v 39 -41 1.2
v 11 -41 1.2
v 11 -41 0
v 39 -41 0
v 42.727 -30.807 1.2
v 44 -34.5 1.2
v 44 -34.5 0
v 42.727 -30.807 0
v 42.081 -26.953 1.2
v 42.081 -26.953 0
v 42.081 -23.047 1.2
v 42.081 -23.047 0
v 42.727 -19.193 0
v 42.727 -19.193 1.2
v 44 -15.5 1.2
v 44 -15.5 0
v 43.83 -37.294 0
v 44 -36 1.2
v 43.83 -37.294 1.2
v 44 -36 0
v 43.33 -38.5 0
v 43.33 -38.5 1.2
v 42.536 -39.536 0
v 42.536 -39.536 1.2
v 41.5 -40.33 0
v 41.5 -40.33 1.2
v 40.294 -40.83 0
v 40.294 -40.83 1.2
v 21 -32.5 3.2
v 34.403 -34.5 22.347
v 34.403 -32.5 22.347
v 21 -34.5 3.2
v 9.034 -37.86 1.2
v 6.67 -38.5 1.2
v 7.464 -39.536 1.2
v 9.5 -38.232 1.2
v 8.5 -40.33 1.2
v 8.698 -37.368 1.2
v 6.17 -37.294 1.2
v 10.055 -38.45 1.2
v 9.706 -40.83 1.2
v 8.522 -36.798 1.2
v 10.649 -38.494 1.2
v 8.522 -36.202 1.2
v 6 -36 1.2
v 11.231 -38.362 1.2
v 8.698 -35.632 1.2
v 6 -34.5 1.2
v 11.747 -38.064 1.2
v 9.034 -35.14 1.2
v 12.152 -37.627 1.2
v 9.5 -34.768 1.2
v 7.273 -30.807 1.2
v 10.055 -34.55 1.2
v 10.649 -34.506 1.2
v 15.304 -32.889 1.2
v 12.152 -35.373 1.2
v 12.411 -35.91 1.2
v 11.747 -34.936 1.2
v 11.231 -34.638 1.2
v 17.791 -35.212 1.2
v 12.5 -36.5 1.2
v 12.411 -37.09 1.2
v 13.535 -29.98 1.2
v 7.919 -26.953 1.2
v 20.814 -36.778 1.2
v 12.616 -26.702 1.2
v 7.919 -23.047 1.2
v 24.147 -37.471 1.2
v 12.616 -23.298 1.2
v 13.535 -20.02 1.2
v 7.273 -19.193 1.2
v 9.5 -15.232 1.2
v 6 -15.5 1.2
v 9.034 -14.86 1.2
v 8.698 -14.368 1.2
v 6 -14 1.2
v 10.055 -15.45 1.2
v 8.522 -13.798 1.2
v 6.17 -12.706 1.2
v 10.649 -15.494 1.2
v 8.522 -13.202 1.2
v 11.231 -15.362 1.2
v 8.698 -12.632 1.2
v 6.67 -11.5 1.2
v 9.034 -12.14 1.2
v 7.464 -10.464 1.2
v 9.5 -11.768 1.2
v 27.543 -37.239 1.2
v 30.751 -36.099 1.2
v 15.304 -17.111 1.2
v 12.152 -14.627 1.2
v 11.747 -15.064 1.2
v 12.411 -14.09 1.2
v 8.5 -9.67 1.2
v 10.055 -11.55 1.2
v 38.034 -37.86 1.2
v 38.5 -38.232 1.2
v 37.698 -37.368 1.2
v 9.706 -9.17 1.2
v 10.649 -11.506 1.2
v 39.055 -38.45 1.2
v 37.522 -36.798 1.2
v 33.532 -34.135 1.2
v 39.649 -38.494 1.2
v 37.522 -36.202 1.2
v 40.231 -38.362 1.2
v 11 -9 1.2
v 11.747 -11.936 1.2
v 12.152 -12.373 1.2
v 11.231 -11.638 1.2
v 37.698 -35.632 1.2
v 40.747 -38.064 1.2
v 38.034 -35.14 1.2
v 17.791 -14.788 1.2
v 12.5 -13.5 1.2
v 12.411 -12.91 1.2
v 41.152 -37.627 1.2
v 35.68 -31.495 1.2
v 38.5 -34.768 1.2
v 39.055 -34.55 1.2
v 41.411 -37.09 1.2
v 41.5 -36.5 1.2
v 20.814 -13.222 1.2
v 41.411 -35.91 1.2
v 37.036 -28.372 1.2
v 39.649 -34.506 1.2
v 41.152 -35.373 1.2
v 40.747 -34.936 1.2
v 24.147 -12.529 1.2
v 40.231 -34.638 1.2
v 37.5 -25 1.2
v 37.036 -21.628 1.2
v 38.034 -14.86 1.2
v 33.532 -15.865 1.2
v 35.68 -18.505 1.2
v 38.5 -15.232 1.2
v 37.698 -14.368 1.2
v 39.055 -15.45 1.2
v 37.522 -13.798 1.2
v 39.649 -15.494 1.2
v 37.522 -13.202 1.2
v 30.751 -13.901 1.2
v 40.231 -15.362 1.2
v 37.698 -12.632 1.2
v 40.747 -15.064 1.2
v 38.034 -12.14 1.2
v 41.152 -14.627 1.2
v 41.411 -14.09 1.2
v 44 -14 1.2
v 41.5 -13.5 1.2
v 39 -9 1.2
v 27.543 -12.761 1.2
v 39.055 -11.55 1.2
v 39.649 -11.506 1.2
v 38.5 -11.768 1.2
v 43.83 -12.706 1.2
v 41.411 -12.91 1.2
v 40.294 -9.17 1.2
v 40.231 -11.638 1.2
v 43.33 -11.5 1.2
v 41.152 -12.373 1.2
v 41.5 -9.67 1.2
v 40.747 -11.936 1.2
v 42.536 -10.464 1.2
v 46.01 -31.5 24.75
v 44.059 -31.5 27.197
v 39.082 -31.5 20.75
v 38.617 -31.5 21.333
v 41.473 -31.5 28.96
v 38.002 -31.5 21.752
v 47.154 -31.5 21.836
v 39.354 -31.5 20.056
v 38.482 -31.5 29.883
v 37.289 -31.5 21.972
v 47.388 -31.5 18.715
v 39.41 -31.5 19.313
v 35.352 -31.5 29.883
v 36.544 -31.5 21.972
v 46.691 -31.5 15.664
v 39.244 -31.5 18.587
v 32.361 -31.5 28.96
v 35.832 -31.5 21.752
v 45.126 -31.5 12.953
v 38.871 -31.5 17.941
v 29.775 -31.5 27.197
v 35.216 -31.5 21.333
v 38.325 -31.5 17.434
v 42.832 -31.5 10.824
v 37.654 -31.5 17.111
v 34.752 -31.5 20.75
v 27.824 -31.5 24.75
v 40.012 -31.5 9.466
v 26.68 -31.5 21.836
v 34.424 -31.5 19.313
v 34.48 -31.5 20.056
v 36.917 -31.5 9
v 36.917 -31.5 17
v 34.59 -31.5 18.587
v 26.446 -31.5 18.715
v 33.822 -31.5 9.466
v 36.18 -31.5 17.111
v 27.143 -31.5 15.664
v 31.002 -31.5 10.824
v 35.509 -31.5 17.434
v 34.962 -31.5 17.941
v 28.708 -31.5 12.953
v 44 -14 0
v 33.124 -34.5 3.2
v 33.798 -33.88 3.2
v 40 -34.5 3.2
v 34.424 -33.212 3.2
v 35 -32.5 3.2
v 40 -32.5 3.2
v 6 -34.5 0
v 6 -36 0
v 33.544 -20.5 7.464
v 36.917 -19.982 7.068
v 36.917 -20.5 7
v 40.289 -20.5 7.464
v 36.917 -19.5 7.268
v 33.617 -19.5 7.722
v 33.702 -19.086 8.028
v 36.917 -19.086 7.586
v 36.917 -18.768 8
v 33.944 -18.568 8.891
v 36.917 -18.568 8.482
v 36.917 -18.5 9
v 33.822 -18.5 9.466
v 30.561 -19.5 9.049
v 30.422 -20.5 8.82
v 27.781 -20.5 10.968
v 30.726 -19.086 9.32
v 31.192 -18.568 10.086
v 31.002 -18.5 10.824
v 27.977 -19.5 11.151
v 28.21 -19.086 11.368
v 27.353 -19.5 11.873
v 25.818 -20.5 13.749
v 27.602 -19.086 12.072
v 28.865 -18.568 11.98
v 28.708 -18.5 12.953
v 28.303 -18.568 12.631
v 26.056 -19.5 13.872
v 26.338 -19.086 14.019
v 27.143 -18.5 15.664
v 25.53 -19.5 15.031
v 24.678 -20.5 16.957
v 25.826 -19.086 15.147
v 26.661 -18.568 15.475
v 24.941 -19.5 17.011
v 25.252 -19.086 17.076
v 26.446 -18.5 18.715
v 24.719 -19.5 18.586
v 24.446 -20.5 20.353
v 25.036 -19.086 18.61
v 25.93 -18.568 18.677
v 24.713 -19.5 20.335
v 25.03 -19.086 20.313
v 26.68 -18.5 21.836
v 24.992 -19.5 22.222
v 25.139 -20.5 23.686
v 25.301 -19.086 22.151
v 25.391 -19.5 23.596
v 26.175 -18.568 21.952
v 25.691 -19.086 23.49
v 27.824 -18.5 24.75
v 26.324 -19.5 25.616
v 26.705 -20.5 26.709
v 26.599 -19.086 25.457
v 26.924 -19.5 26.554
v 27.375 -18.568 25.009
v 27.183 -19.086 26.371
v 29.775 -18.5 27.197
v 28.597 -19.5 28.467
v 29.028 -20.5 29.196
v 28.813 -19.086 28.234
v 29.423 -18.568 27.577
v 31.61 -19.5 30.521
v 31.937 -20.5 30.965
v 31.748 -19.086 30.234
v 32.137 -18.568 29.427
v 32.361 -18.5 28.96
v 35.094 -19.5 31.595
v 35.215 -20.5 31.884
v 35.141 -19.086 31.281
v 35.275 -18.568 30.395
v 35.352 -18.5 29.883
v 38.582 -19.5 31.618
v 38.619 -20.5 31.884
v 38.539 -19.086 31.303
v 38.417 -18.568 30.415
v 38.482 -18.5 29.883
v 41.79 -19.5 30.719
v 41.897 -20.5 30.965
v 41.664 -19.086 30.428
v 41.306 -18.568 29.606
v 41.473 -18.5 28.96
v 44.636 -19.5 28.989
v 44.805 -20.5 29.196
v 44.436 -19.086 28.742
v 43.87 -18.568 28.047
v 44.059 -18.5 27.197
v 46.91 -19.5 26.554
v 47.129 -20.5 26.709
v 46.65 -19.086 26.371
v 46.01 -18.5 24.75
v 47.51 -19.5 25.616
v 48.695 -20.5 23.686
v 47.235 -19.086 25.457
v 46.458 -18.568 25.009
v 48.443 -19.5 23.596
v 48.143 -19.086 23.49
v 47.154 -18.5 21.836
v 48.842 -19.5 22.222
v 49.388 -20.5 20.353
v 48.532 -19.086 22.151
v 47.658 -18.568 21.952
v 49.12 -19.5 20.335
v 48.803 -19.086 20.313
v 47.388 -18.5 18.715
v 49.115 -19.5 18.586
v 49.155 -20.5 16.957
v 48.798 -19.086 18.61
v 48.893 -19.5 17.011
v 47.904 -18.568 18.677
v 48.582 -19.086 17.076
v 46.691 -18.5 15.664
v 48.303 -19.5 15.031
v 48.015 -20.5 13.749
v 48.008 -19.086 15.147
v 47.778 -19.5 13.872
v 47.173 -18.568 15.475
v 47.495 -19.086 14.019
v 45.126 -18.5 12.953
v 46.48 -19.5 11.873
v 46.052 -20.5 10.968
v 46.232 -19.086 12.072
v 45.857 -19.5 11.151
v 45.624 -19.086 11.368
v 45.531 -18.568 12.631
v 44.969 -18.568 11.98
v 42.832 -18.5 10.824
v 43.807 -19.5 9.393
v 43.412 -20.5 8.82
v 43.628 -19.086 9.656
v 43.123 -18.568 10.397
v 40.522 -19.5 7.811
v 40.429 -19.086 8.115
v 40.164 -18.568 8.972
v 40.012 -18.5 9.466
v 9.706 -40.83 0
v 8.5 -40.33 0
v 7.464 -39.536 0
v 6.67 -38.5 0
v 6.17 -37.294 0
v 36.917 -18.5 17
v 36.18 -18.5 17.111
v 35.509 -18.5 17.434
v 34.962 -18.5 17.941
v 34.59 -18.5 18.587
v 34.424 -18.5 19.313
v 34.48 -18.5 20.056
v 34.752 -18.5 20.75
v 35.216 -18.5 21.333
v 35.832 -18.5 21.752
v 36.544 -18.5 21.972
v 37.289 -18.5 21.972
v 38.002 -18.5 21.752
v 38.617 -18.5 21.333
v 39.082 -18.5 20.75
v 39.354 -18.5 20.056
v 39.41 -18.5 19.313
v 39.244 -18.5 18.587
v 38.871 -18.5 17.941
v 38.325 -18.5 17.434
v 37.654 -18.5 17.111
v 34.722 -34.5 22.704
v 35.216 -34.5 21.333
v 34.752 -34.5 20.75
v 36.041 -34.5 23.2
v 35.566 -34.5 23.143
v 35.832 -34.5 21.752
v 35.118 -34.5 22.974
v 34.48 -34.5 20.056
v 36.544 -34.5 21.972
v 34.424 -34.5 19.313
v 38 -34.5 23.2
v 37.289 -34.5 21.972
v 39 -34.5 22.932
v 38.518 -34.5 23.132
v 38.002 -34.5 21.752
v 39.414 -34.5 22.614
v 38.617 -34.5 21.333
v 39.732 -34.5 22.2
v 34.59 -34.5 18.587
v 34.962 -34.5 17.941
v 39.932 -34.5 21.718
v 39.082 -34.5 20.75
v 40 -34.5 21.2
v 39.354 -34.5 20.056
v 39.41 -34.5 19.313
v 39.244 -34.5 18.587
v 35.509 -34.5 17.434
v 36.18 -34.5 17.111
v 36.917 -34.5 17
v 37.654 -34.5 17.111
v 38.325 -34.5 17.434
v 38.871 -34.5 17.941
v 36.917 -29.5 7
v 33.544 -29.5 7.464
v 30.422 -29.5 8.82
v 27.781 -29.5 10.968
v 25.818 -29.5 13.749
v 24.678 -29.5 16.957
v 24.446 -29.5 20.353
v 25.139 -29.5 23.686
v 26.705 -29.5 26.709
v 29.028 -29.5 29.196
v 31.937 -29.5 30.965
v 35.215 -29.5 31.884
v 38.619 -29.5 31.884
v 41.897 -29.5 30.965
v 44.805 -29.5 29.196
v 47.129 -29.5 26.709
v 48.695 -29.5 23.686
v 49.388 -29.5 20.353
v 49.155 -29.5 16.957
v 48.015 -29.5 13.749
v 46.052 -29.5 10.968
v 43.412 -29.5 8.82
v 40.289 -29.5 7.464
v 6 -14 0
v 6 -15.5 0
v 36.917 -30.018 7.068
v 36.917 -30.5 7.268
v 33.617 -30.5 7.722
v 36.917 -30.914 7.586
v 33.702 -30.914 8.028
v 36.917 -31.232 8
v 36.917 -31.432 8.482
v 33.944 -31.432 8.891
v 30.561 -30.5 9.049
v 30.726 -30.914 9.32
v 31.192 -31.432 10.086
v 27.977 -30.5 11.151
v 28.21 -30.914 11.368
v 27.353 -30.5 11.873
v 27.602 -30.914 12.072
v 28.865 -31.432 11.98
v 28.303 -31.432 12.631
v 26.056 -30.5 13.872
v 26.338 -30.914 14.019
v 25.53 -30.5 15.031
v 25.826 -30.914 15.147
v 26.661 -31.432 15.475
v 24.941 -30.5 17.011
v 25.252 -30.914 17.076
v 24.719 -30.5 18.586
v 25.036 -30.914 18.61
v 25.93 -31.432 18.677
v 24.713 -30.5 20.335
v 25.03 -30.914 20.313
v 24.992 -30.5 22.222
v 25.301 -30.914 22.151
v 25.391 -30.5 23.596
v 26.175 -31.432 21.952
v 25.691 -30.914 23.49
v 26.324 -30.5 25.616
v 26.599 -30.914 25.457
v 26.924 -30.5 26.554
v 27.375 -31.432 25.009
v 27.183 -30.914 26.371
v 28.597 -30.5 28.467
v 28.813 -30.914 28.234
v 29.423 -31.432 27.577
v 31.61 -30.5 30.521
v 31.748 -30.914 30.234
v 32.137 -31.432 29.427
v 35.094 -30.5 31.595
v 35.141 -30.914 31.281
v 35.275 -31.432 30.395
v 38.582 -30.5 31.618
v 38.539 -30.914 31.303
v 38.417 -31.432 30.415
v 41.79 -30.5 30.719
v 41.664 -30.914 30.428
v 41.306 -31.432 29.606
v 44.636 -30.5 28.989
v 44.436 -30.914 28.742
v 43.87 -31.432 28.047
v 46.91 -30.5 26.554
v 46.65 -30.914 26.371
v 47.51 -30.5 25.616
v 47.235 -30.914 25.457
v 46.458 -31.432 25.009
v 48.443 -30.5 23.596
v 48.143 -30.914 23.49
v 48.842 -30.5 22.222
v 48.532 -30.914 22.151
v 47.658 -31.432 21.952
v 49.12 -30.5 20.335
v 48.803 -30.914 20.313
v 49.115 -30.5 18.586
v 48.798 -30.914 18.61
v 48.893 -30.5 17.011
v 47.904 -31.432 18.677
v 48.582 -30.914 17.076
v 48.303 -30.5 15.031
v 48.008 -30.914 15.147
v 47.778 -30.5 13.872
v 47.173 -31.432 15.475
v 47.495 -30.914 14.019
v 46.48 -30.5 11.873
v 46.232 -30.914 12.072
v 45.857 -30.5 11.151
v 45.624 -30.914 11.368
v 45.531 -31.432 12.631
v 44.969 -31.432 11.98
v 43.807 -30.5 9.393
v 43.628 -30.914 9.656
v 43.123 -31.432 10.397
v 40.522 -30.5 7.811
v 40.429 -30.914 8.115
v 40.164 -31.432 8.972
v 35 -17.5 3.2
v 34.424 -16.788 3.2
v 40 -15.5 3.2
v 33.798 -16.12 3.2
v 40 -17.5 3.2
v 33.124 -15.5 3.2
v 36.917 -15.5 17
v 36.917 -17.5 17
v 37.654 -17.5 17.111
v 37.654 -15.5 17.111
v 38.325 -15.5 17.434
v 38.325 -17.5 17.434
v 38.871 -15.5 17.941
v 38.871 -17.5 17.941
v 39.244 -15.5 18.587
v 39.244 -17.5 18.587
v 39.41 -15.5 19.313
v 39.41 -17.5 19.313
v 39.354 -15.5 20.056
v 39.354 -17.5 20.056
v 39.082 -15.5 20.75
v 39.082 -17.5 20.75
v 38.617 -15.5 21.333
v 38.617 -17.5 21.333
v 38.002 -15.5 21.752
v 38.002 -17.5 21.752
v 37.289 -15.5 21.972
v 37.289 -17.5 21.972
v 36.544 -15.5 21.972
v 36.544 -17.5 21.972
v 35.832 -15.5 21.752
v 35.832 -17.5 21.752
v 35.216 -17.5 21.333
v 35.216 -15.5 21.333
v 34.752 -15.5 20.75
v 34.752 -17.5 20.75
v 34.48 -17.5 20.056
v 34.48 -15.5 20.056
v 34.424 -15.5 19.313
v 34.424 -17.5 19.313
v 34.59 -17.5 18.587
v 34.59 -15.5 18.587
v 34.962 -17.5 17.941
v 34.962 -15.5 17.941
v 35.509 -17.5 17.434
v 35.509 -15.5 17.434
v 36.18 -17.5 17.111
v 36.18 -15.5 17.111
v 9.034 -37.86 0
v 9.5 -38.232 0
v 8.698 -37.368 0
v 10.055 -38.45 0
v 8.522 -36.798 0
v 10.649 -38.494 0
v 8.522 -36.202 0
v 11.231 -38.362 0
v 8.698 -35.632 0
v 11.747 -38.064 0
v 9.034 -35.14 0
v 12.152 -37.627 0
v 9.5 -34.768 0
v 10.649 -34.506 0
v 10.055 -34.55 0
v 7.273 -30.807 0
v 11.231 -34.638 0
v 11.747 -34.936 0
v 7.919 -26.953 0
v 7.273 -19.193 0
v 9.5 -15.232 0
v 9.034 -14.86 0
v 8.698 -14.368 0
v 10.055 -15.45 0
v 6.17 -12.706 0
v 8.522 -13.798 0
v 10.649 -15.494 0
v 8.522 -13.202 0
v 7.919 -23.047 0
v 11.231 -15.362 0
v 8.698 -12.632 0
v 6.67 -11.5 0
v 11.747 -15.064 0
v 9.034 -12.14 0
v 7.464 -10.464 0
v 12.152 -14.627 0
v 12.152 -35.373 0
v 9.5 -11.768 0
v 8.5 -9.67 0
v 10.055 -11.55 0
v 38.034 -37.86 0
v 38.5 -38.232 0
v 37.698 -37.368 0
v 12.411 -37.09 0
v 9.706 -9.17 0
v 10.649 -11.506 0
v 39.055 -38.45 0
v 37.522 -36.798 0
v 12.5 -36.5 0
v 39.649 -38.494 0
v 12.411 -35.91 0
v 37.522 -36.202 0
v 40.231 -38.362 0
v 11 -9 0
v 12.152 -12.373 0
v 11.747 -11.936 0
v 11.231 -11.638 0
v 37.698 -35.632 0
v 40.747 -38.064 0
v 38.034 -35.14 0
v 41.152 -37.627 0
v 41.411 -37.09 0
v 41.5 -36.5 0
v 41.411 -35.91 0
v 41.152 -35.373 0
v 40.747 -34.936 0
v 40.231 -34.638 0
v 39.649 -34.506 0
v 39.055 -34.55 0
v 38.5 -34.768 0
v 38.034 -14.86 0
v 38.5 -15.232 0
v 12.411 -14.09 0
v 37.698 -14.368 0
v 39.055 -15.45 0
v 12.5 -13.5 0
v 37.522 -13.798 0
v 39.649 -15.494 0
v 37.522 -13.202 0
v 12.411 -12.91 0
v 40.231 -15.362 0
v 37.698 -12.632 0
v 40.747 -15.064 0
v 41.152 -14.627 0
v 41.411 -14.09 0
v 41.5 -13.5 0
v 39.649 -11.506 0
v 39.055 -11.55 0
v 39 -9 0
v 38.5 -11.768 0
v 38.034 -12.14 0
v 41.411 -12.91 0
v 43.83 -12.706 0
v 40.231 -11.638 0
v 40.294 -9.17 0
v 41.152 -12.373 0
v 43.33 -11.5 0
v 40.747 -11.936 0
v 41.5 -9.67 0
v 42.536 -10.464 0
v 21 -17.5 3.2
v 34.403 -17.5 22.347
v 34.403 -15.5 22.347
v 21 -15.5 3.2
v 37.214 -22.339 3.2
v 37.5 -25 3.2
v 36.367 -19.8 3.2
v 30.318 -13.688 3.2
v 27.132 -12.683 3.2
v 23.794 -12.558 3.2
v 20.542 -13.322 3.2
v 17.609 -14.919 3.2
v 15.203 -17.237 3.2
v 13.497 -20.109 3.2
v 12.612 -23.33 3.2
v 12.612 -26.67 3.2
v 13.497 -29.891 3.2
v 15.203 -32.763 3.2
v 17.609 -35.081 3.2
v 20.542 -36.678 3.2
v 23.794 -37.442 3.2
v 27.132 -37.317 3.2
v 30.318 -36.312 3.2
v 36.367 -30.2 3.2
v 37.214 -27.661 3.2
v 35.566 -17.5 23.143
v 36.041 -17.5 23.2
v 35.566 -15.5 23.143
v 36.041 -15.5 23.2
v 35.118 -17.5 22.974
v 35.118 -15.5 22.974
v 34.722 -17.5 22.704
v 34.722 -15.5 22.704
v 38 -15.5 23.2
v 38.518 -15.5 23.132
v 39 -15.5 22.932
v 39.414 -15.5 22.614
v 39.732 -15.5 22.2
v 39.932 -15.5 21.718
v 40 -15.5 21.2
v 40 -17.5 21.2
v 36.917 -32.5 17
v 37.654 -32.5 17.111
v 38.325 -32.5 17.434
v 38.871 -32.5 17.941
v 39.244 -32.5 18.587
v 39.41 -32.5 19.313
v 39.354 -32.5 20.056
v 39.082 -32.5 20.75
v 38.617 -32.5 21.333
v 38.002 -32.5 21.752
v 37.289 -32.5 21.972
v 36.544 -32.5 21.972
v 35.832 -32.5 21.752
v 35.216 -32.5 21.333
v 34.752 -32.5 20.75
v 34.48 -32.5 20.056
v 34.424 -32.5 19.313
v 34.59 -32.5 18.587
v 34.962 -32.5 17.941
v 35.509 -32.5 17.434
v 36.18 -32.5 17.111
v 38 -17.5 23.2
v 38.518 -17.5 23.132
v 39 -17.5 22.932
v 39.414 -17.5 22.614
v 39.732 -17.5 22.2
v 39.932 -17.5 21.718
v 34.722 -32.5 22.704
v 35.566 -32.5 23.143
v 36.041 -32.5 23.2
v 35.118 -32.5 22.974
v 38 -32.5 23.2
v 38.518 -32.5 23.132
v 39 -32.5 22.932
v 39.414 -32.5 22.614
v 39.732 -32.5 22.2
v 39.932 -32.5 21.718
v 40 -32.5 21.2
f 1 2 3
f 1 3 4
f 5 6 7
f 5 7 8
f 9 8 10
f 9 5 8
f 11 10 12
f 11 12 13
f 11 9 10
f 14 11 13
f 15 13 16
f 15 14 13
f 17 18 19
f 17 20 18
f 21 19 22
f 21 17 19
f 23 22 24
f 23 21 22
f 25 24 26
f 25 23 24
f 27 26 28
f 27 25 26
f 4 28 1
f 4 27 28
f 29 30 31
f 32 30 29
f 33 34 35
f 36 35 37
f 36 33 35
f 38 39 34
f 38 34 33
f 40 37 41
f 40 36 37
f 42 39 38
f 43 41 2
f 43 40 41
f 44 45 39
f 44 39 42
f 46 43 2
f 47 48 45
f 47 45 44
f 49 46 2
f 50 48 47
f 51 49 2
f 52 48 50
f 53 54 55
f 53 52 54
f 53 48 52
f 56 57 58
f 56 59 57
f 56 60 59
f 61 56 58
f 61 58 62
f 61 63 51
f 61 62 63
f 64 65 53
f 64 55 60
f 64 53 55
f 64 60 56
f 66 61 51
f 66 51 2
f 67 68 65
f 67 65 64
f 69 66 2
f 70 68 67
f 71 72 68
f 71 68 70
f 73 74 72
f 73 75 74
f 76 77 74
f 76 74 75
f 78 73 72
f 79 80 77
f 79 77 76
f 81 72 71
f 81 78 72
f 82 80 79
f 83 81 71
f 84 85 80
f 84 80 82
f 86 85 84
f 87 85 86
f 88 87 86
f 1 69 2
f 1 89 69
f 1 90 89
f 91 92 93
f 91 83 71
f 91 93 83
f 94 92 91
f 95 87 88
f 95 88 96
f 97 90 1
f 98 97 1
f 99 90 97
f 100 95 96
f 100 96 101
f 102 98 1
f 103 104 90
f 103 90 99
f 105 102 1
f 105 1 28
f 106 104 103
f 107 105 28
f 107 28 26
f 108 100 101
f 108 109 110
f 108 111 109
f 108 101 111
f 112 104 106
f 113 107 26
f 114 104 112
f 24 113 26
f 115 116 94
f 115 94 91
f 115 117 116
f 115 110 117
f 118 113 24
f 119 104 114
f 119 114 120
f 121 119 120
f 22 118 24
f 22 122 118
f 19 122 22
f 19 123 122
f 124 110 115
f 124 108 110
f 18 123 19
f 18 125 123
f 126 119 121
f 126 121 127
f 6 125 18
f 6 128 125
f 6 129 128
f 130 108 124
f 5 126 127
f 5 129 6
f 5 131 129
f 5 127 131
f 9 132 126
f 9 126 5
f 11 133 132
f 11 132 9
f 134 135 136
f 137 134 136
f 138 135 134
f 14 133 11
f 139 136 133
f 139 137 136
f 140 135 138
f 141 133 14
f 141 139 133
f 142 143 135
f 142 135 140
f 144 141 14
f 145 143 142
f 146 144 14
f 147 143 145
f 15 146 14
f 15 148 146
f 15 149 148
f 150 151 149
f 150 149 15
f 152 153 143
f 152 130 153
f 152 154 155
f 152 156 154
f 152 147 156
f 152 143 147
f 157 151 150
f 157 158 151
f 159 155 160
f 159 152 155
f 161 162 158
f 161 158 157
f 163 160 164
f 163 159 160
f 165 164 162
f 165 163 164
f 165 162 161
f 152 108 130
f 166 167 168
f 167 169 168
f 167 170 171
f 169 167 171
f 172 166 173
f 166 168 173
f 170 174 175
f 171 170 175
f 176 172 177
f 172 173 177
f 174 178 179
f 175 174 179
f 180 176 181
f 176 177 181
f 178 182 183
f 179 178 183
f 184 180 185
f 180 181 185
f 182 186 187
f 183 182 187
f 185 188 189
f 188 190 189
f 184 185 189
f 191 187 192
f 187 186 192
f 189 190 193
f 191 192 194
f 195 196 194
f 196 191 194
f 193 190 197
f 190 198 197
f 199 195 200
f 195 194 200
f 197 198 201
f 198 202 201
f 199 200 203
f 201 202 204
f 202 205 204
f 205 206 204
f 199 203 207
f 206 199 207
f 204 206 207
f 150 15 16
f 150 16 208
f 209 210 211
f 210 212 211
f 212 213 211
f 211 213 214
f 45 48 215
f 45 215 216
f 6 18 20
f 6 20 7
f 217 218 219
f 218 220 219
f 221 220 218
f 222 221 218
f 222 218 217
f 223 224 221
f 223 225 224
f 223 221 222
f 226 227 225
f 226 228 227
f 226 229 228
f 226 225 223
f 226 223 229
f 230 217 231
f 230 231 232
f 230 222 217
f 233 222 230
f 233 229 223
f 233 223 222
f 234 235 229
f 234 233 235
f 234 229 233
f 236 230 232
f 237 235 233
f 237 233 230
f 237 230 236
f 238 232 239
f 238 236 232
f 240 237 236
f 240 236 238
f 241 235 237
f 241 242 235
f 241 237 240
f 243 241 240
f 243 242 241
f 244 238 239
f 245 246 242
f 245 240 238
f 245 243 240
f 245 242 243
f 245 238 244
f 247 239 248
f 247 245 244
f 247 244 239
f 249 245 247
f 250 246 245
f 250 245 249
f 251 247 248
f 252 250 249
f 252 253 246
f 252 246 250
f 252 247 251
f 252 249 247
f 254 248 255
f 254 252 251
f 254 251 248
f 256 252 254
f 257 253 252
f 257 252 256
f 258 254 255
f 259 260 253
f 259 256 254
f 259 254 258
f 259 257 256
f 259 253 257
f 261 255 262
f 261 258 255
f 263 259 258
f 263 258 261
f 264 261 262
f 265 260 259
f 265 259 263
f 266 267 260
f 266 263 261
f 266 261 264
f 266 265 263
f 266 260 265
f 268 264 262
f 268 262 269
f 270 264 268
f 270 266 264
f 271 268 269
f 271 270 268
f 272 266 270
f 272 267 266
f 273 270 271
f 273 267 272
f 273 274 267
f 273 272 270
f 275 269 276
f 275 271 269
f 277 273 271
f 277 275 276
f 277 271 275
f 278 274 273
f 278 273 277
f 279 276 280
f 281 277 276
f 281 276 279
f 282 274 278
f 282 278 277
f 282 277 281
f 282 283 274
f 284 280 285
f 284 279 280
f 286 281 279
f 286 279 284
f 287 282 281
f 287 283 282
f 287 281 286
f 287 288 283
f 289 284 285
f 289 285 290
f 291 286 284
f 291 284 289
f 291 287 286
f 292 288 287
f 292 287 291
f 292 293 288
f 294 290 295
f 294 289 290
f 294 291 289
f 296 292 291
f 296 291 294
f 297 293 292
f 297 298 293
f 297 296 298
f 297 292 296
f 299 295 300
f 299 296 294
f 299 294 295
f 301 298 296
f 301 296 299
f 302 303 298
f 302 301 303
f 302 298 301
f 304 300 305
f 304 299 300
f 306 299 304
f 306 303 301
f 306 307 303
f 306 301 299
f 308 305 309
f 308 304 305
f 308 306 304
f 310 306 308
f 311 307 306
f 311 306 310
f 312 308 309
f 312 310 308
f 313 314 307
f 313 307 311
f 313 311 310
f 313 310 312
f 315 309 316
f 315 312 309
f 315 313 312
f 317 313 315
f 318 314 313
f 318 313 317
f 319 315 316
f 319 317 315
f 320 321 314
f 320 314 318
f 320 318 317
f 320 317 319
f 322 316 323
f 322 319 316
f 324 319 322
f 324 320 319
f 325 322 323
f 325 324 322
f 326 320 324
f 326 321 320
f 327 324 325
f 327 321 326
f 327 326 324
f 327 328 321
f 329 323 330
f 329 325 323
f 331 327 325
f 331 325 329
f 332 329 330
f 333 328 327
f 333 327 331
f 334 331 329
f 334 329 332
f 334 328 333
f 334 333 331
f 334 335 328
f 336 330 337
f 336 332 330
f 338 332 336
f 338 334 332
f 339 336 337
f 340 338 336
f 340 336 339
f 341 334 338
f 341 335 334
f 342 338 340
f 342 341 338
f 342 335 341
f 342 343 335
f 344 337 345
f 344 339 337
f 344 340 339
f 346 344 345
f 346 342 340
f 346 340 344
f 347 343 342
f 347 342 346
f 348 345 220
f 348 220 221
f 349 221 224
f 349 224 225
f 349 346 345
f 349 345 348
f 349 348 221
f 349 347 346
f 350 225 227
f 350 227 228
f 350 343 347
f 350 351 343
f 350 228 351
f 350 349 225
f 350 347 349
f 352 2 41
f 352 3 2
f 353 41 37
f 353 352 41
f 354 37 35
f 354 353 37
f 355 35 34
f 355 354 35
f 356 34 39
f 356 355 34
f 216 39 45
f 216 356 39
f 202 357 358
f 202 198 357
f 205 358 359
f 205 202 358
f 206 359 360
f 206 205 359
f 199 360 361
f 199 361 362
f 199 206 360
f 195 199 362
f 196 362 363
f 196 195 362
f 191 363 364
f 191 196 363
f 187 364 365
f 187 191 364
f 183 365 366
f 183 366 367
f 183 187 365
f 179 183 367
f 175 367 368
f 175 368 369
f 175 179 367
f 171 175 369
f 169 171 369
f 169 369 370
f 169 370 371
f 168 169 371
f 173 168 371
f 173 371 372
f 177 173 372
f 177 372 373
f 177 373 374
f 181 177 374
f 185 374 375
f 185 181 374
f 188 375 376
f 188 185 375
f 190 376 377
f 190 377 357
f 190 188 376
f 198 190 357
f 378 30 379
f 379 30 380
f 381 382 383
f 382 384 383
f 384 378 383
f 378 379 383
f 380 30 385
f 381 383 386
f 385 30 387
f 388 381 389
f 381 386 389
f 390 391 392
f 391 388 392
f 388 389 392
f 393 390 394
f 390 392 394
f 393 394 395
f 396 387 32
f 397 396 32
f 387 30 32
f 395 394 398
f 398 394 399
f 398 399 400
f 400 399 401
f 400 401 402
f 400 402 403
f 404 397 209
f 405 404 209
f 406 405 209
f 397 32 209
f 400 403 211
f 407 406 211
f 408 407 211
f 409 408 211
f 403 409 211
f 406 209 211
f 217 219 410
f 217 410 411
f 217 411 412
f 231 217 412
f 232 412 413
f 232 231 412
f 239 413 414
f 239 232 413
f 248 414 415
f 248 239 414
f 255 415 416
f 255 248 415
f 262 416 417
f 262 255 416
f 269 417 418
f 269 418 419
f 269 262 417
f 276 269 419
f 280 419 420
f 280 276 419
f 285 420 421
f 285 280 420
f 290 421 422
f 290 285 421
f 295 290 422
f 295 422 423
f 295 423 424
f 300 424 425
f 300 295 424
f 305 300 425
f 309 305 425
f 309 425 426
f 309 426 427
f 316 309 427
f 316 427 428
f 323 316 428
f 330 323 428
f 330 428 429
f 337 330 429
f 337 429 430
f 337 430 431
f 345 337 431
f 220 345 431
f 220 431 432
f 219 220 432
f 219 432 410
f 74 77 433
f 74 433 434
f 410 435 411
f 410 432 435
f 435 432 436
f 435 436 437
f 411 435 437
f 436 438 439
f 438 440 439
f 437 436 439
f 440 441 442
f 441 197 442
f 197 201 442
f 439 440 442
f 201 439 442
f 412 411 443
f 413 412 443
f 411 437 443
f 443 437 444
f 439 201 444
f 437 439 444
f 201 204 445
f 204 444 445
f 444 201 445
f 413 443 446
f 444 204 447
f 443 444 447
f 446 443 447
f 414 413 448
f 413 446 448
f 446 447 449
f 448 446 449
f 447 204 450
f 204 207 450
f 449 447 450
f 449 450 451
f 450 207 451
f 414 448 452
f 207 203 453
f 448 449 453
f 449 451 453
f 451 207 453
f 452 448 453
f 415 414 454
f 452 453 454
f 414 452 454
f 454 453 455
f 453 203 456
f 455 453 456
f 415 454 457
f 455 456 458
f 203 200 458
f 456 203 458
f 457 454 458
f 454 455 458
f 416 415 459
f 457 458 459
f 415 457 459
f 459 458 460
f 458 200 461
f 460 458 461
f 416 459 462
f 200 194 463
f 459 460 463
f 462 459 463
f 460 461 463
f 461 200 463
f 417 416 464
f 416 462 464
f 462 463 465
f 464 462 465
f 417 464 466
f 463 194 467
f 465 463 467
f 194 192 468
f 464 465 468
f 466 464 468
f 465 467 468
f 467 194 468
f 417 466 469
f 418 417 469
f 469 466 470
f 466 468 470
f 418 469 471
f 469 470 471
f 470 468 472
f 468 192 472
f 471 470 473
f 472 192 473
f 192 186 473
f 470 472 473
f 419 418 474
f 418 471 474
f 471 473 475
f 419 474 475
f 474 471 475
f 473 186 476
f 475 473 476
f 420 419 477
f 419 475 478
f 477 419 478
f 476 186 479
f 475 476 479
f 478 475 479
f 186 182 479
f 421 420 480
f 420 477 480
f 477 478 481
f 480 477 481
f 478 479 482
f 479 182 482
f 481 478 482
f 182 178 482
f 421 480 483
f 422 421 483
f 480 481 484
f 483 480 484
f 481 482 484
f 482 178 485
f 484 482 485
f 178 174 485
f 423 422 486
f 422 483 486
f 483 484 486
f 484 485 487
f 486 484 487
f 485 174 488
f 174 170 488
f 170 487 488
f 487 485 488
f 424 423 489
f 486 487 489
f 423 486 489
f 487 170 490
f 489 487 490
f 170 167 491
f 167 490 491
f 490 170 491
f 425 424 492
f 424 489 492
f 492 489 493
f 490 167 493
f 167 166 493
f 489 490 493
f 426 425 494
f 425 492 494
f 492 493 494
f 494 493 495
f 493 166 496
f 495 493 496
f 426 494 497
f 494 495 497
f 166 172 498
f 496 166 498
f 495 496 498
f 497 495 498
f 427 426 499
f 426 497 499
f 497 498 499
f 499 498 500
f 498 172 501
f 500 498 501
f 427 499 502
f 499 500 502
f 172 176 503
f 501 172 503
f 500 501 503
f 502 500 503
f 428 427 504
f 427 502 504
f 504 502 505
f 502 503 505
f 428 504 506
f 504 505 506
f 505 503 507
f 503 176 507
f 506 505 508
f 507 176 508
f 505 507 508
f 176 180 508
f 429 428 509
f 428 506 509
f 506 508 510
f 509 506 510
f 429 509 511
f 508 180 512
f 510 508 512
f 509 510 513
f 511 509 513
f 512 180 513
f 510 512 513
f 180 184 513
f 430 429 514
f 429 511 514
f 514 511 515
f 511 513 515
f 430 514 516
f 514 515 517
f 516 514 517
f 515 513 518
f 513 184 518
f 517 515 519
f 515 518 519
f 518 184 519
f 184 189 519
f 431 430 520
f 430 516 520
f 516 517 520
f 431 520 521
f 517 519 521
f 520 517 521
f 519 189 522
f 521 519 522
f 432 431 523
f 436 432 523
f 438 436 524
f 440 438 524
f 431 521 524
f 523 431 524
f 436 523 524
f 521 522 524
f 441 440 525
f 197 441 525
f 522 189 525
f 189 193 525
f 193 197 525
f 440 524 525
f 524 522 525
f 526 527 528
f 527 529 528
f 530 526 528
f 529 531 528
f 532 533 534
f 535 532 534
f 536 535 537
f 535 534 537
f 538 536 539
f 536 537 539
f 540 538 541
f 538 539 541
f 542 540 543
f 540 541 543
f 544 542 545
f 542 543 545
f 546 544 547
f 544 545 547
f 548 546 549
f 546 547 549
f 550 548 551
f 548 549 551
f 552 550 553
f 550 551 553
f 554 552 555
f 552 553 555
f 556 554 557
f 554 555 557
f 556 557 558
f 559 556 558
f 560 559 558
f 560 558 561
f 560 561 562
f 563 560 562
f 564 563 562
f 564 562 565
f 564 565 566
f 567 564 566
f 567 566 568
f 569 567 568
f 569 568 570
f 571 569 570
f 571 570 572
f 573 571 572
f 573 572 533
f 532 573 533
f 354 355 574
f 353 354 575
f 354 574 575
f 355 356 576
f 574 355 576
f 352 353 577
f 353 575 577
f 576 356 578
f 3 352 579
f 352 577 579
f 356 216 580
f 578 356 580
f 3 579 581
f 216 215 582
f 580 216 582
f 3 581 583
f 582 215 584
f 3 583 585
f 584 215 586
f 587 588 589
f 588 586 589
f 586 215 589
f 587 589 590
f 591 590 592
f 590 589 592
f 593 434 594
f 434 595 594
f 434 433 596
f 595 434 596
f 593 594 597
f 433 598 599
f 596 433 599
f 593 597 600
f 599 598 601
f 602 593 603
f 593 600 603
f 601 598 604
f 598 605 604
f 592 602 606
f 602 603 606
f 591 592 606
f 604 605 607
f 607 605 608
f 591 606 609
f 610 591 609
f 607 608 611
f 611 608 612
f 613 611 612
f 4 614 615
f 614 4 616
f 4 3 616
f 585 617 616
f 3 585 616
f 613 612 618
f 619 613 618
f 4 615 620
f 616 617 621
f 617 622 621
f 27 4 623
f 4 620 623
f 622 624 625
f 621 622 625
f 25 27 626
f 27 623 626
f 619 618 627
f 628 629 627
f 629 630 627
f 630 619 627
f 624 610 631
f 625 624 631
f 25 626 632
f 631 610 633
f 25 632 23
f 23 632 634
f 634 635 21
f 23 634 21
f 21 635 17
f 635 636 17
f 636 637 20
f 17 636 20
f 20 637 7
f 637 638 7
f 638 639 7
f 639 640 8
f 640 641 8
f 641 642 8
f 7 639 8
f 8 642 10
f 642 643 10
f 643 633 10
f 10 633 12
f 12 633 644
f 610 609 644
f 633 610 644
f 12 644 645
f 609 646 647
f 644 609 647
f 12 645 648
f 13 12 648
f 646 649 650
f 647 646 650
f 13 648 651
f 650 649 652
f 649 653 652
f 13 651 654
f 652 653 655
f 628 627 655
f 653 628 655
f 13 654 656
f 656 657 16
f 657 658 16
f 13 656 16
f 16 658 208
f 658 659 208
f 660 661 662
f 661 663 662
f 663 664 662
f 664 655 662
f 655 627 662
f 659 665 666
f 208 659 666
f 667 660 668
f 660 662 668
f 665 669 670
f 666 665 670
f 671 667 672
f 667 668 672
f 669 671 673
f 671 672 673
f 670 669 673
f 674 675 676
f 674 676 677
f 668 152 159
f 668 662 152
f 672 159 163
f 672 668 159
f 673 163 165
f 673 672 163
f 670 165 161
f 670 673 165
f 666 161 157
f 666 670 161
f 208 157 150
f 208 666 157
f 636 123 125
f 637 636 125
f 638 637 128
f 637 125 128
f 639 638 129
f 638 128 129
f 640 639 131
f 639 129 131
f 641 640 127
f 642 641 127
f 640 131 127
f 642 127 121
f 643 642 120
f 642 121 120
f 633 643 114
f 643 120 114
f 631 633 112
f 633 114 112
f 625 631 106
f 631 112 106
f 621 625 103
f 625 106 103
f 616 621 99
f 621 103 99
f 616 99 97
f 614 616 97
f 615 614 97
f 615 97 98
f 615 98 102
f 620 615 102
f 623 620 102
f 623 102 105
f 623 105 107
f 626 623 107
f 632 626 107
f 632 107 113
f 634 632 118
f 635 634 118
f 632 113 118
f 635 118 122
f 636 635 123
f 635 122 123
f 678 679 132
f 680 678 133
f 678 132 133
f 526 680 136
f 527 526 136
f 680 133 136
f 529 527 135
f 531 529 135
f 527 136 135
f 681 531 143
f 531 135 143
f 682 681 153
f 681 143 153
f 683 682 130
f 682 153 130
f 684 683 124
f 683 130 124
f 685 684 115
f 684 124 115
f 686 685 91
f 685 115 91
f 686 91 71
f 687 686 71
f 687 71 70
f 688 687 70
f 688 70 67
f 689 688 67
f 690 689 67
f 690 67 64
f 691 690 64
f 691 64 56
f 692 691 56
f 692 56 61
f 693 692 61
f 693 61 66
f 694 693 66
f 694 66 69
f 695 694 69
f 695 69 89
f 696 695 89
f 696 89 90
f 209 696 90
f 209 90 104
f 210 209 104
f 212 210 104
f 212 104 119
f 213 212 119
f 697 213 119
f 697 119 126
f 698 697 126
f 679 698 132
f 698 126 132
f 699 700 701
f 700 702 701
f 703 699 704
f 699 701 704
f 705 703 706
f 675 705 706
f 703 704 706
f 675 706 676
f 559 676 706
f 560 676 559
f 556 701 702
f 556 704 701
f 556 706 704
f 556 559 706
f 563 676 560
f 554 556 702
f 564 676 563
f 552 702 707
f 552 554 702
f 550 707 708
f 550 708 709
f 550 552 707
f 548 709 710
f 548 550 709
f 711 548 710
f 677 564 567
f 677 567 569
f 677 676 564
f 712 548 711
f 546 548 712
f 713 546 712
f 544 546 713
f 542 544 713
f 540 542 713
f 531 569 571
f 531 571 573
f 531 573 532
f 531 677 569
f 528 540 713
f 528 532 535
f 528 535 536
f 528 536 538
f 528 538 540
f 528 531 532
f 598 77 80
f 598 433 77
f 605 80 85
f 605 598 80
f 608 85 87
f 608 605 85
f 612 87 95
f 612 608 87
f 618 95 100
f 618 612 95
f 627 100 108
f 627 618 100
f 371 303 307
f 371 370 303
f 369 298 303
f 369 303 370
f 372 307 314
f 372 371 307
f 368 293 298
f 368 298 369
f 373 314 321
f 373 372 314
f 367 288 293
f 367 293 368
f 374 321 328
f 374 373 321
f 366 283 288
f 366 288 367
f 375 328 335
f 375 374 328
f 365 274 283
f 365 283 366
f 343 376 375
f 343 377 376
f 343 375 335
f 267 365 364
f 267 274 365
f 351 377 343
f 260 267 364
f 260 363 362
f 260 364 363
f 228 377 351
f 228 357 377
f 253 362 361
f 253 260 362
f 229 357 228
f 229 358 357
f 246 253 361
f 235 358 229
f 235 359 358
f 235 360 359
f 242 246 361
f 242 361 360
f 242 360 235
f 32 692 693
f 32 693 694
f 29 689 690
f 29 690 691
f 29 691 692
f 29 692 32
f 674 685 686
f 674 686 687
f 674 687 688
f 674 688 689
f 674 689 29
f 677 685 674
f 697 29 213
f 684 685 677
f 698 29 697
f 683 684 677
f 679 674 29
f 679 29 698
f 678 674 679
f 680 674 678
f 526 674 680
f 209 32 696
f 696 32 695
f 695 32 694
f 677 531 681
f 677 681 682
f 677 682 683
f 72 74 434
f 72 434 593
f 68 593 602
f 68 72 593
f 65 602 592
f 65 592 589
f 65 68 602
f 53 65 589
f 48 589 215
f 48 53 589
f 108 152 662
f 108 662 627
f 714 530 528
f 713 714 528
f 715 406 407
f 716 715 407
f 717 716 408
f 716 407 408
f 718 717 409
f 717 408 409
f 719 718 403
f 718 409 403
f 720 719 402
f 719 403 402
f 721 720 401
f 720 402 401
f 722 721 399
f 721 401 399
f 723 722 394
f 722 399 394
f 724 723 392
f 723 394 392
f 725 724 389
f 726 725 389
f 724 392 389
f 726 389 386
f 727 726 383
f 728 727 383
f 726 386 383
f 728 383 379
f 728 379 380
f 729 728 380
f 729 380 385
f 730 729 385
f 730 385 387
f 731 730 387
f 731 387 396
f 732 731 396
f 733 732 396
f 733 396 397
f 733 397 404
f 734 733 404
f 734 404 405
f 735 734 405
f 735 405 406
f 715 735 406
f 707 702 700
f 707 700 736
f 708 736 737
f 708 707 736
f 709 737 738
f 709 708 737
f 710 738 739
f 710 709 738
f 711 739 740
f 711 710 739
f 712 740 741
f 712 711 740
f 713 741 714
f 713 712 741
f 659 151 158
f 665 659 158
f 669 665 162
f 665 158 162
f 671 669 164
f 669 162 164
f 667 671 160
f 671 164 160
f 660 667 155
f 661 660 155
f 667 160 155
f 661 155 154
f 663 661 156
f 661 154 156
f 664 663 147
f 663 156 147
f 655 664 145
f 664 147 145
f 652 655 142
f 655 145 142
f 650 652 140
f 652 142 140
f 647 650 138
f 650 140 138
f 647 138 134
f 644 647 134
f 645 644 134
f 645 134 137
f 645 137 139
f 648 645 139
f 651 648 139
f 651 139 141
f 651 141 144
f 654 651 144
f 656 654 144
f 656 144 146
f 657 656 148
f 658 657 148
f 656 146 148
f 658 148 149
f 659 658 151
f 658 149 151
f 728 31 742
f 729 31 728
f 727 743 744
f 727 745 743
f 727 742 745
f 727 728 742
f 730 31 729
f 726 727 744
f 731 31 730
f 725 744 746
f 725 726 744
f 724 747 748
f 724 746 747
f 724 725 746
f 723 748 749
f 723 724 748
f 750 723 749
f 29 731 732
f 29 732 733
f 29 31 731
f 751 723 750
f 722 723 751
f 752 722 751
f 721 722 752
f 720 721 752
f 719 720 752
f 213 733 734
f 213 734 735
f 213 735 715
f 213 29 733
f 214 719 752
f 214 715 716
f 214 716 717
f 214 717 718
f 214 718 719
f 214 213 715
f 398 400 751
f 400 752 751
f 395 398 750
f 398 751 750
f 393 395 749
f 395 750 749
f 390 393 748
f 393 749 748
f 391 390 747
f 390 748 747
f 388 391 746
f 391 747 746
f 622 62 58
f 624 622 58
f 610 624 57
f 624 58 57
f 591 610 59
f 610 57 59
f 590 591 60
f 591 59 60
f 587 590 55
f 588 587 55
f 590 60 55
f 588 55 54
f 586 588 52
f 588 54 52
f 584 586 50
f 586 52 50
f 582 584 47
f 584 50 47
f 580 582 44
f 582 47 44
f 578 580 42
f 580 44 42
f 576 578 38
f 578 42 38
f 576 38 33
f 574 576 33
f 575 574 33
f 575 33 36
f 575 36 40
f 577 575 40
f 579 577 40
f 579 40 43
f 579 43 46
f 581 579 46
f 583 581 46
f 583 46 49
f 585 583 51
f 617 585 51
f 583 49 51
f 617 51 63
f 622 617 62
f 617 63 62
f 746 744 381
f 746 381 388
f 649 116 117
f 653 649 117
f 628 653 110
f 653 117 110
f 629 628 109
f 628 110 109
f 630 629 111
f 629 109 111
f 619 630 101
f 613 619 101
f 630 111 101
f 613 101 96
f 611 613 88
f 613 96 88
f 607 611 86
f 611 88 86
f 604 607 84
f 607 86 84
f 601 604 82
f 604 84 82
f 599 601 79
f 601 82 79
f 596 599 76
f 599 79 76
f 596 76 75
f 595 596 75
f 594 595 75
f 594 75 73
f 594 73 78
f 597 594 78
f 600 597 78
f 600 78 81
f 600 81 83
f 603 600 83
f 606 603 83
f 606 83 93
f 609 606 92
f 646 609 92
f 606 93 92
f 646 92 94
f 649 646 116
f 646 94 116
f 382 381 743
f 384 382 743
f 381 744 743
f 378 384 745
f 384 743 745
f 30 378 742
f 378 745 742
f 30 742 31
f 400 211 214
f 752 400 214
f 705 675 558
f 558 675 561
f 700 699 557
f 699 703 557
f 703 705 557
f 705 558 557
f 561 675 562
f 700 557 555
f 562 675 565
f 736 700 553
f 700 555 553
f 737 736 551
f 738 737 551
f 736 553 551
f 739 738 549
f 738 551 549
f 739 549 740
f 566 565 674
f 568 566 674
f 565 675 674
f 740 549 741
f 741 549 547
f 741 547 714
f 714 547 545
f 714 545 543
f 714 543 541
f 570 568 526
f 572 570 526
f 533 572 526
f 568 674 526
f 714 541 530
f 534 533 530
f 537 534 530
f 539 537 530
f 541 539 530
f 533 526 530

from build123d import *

# Parameters (mm, degrees)
SKETCH_1_W          = 50
SKETCH_1_H          = 50
EXTRUDE_1_DEPTH     = 1.2
SKETCH_2_W          = 50
SKETCH_2_H          = 50
SKETCH_2_R          = 2
CUT_EXTRUDE_1_DEPTH = 1.2
FILLET_3_R          = 5
SKETCH_3_R          = 12.5
EXTRUDE_2_DEPTH     = 2
SKETCH_4_W          = 25
SKETCH_4_H          = 2
EXTRUDE_3_DEPTH     = 20
CUT_EXTRUDE_2_DEPTH = 23
SKETCH_6_R          = 12.5
SKETCH_6_R_2        = 2.5
EXTRUDE_4_DEPTH     = 6.5
FILLET_4_R          = 2
FILLET_5_R          = 2
SKETCH_7_R          = 2.5
CUT_EXTRUDE_3_DEPTH = 21


with BuildPart() as part:
    # 草图1 → 凸台-拉伸1 (new body)
    with BuildSketch(Plane.XY):
        with Locations((25, -25)):
            Rectangle(SKETCH_1_W, SKETCH_1_H)
    extrude(amount=EXTRUDE_1_DEPTH)

    # 草图2 → 切除-拉伸1 (cut)
    # profile 1 of 5: a face of its own
    with BuildSketch(Plane.XY.offset(1.2)):
        with Locations((25, -25)):
            Rectangle(SKETCH_2_W, SKETCH_2_H)
        with BuildLine():
            ThreePointArc((6, -15.5), (8, -25), (6, -34.5))
            Line((6, -34.5), (6, -41))
            Line((6, -41), (44, -41))
            Line((44, -41), (44, -34.5))
            ThreePointArc((44, -34.5), (42, -25), (44, -15.5))
            Line((44, -15.5), (44, -9))
            Line((44, -9), (6, -9))
            Line((6, -9), (6, -15.5))
        make_face(mode=Mode.SUBTRACT)
    # profile 2 of 5: a face of its own
    with BuildSketch(Plane.XY.offset(1.2)):
        with Locations((39.5, -13.5)):
            Circle(SKETCH_2_R)
    # profile 3 of 5: a face of its own
    with BuildSketch(Plane.XY.offset(1.2)):
        with Locations((10.5, -36.5)):
            Circle(SKETCH_2_R)
    # profile 4 of 5: a face of its own
    with BuildSketch(Plane.XY.offset(1.2)):
        with Locations((10.5, -13.5)):
            Circle(SKETCH_2_R)
    # profile 5 of 5: a face of its own
    with BuildSketch(Plane.XY.offset(1.2)):
        with Locations((39.5, -36.5)):
            Circle(SKETCH_2_R)
    extrude(amount=-CUT_EXTRUDE_1_DEPTH, mode=Mode.SUBTRACT)

    # 圆角3
    fillet_3_edges = [part.edges().sort_by_distance(p)[0] for p in [
        (6, -41, 0.6),
        (44, -41, 0.6),
        (44, -9, 0.6),
        (6, -9, 0.6),
    ]]
    fillet(fillet_3_edges, radius=FILLET_3_R)

    # 草图3 → 凸台-拉伸2 (add)
    with BuildSketch(Plane.XY.offset(1.2)):
        with Locations((25, -25)):
            Circle(SKETCH_3_R)
    extrude(amount=EXTRUDE_2_DEPTH)

    # 草图4 → 凸台-拉伸3 (add)
    with BuildSketch(Plane.XY.offset(3.2)):
        with Locations((27.5, -33.5)):
            Rectangle(SKETCH_4_W, SKETCH_4_H)
        with Locations((27.5, -16.5)):
            Rectangle(SKETCH_4_W, SKETCH_4_H)
    extrude(amount=EXTRUDE_3_DEPTH)

    # 草图5 → 切除-拉伸2 (cut)
    with BuildSketch(Plane.XZ.offset(34.5)):
        Polygon((35, 23.2), (21, 3.2), (15, 3.2), (15, 23.2), align=None)
    extrude(amount=-CUT_EXTRUDE_2_DEPTH, mode=Mode.SUBTRACT)

    # 圆角5
    fillet_5_edges = [part.edges().sort_by_distance(p)[0] for p in [
        (40, -33.5, 23.2),
        (40, -16.5, 23.2),
        (35, -16.5, 23.2),
        (35, -33.5, 23.2),
    ]]
    fillet(fillet_5_edges, radius=FILLET_5_R)

    # 草图7 → 切除-拉伸3 (cut)
    with BuildSketch(Plane.XZ.offset(34.5)):
        with Locations(Location((36.916887115, 19.5, 0), (0, 0, 270))):
            Circle(SKETCH_7_R)
    extrude(amount=-CUT_EXTRUDE_3_DEPTH, mode=Mode.SUBTRACT)


with BuildPart() as body_2:
    # 草图6 → 凸台-拉伸4 (new, symmetric)
    with BuildSketch(Plane(origin=(0, -25, 0), x_dir=(1, 0, 0), z_dir=(0, 1, 0))):
        with Locations(Location((36.916887115, -19.5, 0), (0, 0, 90))):
            Circle(SKETCH_6_R)
        with Locations(Location((36.916887115, -19.5, 0), (0, 0, 90))):
            Circle(SKETCH_6_R_2, mode=Mode.SUBTRACT)
    extrude(amount=EXTRUDE_4_DEPTH, both=True)

    # 圆角4
    fillet_4_edges = [body_2.edges().sort_by_distance(p)[0] for p in [
        (36.916887115, -31.5, 32),
        (36.916887115, -18.5, 32),
    ]]
    fillet(fillet_4_edges, radius=FILLET_4_R)


solid = Compound([part.part, body_2.part])
